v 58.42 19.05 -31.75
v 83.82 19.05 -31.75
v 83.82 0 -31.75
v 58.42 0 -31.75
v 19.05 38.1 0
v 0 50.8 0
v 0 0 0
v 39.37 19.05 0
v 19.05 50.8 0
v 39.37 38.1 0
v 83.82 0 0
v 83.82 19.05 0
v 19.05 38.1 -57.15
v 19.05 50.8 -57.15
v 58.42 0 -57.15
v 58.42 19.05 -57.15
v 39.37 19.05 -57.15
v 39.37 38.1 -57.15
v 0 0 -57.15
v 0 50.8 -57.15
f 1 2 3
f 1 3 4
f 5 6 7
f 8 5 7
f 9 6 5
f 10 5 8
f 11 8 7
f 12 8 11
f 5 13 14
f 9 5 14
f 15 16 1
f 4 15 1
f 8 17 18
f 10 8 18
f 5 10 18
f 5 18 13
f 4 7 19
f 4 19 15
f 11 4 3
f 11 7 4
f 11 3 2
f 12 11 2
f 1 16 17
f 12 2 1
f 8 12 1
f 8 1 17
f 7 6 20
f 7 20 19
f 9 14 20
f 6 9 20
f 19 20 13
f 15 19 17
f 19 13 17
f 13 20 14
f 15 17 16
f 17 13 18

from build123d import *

# Parameters (mm, degrees)
F1_DEPTH = 57.15
F2_W     = 25.4
F2_H     = 25.4
F3_DEPTH = 19.05


with BuildPart() as f1:
    # F0 (on Top) → F1 (new body)
    with BuildSketch(Plane.XY):
        Polygon((0, 50.8), (0, 0), (83.82, 0), (83.82, 19.05), (39.37, 19.05), (39.37, 38.1), (19.05, 38.1), (19.05, 50.8), align=None)
    extrude(amount=-F1_DEPTH)

    # F2 (on face) → F3 (cut, through all)
    with BuildSketch(Plane(origin=(0, 19.05, 0), x_dir=(-1, 0, 0), z_dir=(0, 1, 0))):
        with Locations((-71.12, -44.45)):
            Rectangle(F2_W, F2_H)
    extrude(amount=-F3_DEPTH, mode=Mode.SUBTRACT)


solid = f1.part
